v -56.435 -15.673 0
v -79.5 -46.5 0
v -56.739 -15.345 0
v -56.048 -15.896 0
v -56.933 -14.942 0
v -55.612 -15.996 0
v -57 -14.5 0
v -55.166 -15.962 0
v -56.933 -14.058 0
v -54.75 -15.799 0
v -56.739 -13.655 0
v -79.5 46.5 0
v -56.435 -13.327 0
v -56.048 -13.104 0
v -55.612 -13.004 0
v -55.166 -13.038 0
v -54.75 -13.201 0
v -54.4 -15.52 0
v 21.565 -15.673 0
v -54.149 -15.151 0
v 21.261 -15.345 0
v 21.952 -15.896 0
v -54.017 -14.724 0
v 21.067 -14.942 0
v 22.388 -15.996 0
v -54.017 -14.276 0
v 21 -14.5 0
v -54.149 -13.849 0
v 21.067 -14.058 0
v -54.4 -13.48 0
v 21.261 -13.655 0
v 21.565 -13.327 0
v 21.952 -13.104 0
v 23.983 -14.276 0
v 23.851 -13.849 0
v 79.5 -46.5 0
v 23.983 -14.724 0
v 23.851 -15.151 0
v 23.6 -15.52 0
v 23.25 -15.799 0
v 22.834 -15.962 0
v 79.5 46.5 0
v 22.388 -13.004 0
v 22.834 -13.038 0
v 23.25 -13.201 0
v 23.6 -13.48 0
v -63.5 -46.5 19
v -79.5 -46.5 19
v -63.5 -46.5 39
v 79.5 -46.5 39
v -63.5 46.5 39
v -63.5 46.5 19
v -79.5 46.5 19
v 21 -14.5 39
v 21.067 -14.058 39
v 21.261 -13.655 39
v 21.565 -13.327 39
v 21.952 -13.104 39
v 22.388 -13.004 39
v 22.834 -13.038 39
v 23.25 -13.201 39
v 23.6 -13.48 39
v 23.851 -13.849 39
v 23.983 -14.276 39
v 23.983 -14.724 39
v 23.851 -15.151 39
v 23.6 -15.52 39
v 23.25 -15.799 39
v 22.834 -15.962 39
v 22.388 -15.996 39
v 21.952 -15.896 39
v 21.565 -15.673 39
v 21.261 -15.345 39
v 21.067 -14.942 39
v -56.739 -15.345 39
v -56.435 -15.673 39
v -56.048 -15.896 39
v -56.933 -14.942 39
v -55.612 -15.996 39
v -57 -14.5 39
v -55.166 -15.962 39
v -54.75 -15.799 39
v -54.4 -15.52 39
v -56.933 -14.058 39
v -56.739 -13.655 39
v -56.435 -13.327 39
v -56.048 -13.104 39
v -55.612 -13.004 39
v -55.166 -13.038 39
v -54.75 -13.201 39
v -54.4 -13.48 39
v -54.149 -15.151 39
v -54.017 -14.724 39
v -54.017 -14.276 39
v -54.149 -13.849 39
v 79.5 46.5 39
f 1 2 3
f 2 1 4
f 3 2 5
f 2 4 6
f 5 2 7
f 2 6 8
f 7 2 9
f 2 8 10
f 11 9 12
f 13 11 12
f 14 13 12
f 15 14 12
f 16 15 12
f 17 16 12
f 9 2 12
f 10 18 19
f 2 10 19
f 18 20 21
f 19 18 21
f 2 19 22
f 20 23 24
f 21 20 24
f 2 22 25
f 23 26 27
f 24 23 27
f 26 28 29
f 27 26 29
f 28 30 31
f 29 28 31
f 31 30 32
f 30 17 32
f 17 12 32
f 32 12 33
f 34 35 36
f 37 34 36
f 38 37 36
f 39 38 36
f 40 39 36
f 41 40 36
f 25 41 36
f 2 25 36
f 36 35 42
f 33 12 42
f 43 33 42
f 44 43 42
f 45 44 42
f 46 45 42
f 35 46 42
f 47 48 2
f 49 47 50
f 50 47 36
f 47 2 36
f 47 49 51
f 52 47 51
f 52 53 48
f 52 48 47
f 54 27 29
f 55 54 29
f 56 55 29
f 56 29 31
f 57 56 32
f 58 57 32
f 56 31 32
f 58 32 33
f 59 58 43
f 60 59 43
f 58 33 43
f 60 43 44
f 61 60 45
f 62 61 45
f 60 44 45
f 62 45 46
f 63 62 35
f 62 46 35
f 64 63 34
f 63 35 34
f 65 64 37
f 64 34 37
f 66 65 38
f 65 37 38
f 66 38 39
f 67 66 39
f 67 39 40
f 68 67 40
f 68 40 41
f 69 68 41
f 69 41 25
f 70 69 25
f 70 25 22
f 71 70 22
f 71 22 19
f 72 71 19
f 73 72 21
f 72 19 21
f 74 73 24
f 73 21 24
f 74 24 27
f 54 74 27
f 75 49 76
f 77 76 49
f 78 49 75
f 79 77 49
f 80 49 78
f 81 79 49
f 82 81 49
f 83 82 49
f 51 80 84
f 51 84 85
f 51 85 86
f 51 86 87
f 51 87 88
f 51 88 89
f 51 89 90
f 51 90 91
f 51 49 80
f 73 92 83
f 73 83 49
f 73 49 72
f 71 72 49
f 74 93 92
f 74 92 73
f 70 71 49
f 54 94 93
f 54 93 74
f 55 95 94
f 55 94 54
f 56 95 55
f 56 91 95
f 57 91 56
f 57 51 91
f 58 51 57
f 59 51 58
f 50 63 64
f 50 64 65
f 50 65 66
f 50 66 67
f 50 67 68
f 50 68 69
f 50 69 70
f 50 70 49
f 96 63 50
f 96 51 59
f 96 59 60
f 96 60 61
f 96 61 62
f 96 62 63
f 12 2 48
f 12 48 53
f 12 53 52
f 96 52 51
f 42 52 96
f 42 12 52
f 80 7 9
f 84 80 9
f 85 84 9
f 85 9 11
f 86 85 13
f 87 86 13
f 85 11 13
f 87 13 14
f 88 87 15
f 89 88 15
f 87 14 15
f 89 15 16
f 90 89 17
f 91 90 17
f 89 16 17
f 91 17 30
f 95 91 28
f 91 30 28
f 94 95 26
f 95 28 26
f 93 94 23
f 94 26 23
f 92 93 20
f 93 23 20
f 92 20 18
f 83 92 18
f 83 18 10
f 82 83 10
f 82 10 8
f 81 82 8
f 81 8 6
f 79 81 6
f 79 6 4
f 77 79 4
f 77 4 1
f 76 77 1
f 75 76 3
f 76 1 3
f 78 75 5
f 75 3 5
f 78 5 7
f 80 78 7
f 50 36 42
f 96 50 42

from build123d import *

# Parameters (mm, degrees)
SKETCH_1_W          = 159
SKETCH_1_H          = 93
EXTRUDE_1_DEPTH     = 39
SKETCH_2_R          = 1.5
CUT_EXTRUDE_1_DEPTH = 39
SKETCH_3_W          = 16
SKETCH_3_H          = 93
CUT_EXTRUDE_2_DEPTH = 20


with BuildPart() as part:
    # Эскиз1 → Бобышка-Вытянуть1 (new body)
    with BuildSketch(Plane.XY):
        Rectangle(SKETCH_1_W, SKETCH_1_H)
    extrude(amount=EXTRUDE_1_DEPTH)

    # Эскиз2 → Вырез-Вытянуть1 (cut)
    with BuildSketch(Plane(origin=(0, 0, 0), x_dir=(-1, 0, 0), z_dir=(0, 0, -1))):
        with Locations((-22.5, -14.5)):
            Circle(SKETCH_2_R)
        with Locations((55.5, -14.5)):
            Circle(SKETCH_2_R)
    extrude(amount=-CUT_EXTRUDE_1_DEPTH, mode=Mode.SUBTRACT)

    # Эскиз3 → Вырез-Вытянуть2 (cut)
    with BuildSketch(Plane.XY.offset(39)):
        with Locations((-71.5, 0)):
            Rectangle(SKETCH_3_W, SKETCH_3_H)
    extrude(amount=-CUT_EXTRUDE_2_DEPTH, mode=Mode.SUBTRACT)


solid = part.part
